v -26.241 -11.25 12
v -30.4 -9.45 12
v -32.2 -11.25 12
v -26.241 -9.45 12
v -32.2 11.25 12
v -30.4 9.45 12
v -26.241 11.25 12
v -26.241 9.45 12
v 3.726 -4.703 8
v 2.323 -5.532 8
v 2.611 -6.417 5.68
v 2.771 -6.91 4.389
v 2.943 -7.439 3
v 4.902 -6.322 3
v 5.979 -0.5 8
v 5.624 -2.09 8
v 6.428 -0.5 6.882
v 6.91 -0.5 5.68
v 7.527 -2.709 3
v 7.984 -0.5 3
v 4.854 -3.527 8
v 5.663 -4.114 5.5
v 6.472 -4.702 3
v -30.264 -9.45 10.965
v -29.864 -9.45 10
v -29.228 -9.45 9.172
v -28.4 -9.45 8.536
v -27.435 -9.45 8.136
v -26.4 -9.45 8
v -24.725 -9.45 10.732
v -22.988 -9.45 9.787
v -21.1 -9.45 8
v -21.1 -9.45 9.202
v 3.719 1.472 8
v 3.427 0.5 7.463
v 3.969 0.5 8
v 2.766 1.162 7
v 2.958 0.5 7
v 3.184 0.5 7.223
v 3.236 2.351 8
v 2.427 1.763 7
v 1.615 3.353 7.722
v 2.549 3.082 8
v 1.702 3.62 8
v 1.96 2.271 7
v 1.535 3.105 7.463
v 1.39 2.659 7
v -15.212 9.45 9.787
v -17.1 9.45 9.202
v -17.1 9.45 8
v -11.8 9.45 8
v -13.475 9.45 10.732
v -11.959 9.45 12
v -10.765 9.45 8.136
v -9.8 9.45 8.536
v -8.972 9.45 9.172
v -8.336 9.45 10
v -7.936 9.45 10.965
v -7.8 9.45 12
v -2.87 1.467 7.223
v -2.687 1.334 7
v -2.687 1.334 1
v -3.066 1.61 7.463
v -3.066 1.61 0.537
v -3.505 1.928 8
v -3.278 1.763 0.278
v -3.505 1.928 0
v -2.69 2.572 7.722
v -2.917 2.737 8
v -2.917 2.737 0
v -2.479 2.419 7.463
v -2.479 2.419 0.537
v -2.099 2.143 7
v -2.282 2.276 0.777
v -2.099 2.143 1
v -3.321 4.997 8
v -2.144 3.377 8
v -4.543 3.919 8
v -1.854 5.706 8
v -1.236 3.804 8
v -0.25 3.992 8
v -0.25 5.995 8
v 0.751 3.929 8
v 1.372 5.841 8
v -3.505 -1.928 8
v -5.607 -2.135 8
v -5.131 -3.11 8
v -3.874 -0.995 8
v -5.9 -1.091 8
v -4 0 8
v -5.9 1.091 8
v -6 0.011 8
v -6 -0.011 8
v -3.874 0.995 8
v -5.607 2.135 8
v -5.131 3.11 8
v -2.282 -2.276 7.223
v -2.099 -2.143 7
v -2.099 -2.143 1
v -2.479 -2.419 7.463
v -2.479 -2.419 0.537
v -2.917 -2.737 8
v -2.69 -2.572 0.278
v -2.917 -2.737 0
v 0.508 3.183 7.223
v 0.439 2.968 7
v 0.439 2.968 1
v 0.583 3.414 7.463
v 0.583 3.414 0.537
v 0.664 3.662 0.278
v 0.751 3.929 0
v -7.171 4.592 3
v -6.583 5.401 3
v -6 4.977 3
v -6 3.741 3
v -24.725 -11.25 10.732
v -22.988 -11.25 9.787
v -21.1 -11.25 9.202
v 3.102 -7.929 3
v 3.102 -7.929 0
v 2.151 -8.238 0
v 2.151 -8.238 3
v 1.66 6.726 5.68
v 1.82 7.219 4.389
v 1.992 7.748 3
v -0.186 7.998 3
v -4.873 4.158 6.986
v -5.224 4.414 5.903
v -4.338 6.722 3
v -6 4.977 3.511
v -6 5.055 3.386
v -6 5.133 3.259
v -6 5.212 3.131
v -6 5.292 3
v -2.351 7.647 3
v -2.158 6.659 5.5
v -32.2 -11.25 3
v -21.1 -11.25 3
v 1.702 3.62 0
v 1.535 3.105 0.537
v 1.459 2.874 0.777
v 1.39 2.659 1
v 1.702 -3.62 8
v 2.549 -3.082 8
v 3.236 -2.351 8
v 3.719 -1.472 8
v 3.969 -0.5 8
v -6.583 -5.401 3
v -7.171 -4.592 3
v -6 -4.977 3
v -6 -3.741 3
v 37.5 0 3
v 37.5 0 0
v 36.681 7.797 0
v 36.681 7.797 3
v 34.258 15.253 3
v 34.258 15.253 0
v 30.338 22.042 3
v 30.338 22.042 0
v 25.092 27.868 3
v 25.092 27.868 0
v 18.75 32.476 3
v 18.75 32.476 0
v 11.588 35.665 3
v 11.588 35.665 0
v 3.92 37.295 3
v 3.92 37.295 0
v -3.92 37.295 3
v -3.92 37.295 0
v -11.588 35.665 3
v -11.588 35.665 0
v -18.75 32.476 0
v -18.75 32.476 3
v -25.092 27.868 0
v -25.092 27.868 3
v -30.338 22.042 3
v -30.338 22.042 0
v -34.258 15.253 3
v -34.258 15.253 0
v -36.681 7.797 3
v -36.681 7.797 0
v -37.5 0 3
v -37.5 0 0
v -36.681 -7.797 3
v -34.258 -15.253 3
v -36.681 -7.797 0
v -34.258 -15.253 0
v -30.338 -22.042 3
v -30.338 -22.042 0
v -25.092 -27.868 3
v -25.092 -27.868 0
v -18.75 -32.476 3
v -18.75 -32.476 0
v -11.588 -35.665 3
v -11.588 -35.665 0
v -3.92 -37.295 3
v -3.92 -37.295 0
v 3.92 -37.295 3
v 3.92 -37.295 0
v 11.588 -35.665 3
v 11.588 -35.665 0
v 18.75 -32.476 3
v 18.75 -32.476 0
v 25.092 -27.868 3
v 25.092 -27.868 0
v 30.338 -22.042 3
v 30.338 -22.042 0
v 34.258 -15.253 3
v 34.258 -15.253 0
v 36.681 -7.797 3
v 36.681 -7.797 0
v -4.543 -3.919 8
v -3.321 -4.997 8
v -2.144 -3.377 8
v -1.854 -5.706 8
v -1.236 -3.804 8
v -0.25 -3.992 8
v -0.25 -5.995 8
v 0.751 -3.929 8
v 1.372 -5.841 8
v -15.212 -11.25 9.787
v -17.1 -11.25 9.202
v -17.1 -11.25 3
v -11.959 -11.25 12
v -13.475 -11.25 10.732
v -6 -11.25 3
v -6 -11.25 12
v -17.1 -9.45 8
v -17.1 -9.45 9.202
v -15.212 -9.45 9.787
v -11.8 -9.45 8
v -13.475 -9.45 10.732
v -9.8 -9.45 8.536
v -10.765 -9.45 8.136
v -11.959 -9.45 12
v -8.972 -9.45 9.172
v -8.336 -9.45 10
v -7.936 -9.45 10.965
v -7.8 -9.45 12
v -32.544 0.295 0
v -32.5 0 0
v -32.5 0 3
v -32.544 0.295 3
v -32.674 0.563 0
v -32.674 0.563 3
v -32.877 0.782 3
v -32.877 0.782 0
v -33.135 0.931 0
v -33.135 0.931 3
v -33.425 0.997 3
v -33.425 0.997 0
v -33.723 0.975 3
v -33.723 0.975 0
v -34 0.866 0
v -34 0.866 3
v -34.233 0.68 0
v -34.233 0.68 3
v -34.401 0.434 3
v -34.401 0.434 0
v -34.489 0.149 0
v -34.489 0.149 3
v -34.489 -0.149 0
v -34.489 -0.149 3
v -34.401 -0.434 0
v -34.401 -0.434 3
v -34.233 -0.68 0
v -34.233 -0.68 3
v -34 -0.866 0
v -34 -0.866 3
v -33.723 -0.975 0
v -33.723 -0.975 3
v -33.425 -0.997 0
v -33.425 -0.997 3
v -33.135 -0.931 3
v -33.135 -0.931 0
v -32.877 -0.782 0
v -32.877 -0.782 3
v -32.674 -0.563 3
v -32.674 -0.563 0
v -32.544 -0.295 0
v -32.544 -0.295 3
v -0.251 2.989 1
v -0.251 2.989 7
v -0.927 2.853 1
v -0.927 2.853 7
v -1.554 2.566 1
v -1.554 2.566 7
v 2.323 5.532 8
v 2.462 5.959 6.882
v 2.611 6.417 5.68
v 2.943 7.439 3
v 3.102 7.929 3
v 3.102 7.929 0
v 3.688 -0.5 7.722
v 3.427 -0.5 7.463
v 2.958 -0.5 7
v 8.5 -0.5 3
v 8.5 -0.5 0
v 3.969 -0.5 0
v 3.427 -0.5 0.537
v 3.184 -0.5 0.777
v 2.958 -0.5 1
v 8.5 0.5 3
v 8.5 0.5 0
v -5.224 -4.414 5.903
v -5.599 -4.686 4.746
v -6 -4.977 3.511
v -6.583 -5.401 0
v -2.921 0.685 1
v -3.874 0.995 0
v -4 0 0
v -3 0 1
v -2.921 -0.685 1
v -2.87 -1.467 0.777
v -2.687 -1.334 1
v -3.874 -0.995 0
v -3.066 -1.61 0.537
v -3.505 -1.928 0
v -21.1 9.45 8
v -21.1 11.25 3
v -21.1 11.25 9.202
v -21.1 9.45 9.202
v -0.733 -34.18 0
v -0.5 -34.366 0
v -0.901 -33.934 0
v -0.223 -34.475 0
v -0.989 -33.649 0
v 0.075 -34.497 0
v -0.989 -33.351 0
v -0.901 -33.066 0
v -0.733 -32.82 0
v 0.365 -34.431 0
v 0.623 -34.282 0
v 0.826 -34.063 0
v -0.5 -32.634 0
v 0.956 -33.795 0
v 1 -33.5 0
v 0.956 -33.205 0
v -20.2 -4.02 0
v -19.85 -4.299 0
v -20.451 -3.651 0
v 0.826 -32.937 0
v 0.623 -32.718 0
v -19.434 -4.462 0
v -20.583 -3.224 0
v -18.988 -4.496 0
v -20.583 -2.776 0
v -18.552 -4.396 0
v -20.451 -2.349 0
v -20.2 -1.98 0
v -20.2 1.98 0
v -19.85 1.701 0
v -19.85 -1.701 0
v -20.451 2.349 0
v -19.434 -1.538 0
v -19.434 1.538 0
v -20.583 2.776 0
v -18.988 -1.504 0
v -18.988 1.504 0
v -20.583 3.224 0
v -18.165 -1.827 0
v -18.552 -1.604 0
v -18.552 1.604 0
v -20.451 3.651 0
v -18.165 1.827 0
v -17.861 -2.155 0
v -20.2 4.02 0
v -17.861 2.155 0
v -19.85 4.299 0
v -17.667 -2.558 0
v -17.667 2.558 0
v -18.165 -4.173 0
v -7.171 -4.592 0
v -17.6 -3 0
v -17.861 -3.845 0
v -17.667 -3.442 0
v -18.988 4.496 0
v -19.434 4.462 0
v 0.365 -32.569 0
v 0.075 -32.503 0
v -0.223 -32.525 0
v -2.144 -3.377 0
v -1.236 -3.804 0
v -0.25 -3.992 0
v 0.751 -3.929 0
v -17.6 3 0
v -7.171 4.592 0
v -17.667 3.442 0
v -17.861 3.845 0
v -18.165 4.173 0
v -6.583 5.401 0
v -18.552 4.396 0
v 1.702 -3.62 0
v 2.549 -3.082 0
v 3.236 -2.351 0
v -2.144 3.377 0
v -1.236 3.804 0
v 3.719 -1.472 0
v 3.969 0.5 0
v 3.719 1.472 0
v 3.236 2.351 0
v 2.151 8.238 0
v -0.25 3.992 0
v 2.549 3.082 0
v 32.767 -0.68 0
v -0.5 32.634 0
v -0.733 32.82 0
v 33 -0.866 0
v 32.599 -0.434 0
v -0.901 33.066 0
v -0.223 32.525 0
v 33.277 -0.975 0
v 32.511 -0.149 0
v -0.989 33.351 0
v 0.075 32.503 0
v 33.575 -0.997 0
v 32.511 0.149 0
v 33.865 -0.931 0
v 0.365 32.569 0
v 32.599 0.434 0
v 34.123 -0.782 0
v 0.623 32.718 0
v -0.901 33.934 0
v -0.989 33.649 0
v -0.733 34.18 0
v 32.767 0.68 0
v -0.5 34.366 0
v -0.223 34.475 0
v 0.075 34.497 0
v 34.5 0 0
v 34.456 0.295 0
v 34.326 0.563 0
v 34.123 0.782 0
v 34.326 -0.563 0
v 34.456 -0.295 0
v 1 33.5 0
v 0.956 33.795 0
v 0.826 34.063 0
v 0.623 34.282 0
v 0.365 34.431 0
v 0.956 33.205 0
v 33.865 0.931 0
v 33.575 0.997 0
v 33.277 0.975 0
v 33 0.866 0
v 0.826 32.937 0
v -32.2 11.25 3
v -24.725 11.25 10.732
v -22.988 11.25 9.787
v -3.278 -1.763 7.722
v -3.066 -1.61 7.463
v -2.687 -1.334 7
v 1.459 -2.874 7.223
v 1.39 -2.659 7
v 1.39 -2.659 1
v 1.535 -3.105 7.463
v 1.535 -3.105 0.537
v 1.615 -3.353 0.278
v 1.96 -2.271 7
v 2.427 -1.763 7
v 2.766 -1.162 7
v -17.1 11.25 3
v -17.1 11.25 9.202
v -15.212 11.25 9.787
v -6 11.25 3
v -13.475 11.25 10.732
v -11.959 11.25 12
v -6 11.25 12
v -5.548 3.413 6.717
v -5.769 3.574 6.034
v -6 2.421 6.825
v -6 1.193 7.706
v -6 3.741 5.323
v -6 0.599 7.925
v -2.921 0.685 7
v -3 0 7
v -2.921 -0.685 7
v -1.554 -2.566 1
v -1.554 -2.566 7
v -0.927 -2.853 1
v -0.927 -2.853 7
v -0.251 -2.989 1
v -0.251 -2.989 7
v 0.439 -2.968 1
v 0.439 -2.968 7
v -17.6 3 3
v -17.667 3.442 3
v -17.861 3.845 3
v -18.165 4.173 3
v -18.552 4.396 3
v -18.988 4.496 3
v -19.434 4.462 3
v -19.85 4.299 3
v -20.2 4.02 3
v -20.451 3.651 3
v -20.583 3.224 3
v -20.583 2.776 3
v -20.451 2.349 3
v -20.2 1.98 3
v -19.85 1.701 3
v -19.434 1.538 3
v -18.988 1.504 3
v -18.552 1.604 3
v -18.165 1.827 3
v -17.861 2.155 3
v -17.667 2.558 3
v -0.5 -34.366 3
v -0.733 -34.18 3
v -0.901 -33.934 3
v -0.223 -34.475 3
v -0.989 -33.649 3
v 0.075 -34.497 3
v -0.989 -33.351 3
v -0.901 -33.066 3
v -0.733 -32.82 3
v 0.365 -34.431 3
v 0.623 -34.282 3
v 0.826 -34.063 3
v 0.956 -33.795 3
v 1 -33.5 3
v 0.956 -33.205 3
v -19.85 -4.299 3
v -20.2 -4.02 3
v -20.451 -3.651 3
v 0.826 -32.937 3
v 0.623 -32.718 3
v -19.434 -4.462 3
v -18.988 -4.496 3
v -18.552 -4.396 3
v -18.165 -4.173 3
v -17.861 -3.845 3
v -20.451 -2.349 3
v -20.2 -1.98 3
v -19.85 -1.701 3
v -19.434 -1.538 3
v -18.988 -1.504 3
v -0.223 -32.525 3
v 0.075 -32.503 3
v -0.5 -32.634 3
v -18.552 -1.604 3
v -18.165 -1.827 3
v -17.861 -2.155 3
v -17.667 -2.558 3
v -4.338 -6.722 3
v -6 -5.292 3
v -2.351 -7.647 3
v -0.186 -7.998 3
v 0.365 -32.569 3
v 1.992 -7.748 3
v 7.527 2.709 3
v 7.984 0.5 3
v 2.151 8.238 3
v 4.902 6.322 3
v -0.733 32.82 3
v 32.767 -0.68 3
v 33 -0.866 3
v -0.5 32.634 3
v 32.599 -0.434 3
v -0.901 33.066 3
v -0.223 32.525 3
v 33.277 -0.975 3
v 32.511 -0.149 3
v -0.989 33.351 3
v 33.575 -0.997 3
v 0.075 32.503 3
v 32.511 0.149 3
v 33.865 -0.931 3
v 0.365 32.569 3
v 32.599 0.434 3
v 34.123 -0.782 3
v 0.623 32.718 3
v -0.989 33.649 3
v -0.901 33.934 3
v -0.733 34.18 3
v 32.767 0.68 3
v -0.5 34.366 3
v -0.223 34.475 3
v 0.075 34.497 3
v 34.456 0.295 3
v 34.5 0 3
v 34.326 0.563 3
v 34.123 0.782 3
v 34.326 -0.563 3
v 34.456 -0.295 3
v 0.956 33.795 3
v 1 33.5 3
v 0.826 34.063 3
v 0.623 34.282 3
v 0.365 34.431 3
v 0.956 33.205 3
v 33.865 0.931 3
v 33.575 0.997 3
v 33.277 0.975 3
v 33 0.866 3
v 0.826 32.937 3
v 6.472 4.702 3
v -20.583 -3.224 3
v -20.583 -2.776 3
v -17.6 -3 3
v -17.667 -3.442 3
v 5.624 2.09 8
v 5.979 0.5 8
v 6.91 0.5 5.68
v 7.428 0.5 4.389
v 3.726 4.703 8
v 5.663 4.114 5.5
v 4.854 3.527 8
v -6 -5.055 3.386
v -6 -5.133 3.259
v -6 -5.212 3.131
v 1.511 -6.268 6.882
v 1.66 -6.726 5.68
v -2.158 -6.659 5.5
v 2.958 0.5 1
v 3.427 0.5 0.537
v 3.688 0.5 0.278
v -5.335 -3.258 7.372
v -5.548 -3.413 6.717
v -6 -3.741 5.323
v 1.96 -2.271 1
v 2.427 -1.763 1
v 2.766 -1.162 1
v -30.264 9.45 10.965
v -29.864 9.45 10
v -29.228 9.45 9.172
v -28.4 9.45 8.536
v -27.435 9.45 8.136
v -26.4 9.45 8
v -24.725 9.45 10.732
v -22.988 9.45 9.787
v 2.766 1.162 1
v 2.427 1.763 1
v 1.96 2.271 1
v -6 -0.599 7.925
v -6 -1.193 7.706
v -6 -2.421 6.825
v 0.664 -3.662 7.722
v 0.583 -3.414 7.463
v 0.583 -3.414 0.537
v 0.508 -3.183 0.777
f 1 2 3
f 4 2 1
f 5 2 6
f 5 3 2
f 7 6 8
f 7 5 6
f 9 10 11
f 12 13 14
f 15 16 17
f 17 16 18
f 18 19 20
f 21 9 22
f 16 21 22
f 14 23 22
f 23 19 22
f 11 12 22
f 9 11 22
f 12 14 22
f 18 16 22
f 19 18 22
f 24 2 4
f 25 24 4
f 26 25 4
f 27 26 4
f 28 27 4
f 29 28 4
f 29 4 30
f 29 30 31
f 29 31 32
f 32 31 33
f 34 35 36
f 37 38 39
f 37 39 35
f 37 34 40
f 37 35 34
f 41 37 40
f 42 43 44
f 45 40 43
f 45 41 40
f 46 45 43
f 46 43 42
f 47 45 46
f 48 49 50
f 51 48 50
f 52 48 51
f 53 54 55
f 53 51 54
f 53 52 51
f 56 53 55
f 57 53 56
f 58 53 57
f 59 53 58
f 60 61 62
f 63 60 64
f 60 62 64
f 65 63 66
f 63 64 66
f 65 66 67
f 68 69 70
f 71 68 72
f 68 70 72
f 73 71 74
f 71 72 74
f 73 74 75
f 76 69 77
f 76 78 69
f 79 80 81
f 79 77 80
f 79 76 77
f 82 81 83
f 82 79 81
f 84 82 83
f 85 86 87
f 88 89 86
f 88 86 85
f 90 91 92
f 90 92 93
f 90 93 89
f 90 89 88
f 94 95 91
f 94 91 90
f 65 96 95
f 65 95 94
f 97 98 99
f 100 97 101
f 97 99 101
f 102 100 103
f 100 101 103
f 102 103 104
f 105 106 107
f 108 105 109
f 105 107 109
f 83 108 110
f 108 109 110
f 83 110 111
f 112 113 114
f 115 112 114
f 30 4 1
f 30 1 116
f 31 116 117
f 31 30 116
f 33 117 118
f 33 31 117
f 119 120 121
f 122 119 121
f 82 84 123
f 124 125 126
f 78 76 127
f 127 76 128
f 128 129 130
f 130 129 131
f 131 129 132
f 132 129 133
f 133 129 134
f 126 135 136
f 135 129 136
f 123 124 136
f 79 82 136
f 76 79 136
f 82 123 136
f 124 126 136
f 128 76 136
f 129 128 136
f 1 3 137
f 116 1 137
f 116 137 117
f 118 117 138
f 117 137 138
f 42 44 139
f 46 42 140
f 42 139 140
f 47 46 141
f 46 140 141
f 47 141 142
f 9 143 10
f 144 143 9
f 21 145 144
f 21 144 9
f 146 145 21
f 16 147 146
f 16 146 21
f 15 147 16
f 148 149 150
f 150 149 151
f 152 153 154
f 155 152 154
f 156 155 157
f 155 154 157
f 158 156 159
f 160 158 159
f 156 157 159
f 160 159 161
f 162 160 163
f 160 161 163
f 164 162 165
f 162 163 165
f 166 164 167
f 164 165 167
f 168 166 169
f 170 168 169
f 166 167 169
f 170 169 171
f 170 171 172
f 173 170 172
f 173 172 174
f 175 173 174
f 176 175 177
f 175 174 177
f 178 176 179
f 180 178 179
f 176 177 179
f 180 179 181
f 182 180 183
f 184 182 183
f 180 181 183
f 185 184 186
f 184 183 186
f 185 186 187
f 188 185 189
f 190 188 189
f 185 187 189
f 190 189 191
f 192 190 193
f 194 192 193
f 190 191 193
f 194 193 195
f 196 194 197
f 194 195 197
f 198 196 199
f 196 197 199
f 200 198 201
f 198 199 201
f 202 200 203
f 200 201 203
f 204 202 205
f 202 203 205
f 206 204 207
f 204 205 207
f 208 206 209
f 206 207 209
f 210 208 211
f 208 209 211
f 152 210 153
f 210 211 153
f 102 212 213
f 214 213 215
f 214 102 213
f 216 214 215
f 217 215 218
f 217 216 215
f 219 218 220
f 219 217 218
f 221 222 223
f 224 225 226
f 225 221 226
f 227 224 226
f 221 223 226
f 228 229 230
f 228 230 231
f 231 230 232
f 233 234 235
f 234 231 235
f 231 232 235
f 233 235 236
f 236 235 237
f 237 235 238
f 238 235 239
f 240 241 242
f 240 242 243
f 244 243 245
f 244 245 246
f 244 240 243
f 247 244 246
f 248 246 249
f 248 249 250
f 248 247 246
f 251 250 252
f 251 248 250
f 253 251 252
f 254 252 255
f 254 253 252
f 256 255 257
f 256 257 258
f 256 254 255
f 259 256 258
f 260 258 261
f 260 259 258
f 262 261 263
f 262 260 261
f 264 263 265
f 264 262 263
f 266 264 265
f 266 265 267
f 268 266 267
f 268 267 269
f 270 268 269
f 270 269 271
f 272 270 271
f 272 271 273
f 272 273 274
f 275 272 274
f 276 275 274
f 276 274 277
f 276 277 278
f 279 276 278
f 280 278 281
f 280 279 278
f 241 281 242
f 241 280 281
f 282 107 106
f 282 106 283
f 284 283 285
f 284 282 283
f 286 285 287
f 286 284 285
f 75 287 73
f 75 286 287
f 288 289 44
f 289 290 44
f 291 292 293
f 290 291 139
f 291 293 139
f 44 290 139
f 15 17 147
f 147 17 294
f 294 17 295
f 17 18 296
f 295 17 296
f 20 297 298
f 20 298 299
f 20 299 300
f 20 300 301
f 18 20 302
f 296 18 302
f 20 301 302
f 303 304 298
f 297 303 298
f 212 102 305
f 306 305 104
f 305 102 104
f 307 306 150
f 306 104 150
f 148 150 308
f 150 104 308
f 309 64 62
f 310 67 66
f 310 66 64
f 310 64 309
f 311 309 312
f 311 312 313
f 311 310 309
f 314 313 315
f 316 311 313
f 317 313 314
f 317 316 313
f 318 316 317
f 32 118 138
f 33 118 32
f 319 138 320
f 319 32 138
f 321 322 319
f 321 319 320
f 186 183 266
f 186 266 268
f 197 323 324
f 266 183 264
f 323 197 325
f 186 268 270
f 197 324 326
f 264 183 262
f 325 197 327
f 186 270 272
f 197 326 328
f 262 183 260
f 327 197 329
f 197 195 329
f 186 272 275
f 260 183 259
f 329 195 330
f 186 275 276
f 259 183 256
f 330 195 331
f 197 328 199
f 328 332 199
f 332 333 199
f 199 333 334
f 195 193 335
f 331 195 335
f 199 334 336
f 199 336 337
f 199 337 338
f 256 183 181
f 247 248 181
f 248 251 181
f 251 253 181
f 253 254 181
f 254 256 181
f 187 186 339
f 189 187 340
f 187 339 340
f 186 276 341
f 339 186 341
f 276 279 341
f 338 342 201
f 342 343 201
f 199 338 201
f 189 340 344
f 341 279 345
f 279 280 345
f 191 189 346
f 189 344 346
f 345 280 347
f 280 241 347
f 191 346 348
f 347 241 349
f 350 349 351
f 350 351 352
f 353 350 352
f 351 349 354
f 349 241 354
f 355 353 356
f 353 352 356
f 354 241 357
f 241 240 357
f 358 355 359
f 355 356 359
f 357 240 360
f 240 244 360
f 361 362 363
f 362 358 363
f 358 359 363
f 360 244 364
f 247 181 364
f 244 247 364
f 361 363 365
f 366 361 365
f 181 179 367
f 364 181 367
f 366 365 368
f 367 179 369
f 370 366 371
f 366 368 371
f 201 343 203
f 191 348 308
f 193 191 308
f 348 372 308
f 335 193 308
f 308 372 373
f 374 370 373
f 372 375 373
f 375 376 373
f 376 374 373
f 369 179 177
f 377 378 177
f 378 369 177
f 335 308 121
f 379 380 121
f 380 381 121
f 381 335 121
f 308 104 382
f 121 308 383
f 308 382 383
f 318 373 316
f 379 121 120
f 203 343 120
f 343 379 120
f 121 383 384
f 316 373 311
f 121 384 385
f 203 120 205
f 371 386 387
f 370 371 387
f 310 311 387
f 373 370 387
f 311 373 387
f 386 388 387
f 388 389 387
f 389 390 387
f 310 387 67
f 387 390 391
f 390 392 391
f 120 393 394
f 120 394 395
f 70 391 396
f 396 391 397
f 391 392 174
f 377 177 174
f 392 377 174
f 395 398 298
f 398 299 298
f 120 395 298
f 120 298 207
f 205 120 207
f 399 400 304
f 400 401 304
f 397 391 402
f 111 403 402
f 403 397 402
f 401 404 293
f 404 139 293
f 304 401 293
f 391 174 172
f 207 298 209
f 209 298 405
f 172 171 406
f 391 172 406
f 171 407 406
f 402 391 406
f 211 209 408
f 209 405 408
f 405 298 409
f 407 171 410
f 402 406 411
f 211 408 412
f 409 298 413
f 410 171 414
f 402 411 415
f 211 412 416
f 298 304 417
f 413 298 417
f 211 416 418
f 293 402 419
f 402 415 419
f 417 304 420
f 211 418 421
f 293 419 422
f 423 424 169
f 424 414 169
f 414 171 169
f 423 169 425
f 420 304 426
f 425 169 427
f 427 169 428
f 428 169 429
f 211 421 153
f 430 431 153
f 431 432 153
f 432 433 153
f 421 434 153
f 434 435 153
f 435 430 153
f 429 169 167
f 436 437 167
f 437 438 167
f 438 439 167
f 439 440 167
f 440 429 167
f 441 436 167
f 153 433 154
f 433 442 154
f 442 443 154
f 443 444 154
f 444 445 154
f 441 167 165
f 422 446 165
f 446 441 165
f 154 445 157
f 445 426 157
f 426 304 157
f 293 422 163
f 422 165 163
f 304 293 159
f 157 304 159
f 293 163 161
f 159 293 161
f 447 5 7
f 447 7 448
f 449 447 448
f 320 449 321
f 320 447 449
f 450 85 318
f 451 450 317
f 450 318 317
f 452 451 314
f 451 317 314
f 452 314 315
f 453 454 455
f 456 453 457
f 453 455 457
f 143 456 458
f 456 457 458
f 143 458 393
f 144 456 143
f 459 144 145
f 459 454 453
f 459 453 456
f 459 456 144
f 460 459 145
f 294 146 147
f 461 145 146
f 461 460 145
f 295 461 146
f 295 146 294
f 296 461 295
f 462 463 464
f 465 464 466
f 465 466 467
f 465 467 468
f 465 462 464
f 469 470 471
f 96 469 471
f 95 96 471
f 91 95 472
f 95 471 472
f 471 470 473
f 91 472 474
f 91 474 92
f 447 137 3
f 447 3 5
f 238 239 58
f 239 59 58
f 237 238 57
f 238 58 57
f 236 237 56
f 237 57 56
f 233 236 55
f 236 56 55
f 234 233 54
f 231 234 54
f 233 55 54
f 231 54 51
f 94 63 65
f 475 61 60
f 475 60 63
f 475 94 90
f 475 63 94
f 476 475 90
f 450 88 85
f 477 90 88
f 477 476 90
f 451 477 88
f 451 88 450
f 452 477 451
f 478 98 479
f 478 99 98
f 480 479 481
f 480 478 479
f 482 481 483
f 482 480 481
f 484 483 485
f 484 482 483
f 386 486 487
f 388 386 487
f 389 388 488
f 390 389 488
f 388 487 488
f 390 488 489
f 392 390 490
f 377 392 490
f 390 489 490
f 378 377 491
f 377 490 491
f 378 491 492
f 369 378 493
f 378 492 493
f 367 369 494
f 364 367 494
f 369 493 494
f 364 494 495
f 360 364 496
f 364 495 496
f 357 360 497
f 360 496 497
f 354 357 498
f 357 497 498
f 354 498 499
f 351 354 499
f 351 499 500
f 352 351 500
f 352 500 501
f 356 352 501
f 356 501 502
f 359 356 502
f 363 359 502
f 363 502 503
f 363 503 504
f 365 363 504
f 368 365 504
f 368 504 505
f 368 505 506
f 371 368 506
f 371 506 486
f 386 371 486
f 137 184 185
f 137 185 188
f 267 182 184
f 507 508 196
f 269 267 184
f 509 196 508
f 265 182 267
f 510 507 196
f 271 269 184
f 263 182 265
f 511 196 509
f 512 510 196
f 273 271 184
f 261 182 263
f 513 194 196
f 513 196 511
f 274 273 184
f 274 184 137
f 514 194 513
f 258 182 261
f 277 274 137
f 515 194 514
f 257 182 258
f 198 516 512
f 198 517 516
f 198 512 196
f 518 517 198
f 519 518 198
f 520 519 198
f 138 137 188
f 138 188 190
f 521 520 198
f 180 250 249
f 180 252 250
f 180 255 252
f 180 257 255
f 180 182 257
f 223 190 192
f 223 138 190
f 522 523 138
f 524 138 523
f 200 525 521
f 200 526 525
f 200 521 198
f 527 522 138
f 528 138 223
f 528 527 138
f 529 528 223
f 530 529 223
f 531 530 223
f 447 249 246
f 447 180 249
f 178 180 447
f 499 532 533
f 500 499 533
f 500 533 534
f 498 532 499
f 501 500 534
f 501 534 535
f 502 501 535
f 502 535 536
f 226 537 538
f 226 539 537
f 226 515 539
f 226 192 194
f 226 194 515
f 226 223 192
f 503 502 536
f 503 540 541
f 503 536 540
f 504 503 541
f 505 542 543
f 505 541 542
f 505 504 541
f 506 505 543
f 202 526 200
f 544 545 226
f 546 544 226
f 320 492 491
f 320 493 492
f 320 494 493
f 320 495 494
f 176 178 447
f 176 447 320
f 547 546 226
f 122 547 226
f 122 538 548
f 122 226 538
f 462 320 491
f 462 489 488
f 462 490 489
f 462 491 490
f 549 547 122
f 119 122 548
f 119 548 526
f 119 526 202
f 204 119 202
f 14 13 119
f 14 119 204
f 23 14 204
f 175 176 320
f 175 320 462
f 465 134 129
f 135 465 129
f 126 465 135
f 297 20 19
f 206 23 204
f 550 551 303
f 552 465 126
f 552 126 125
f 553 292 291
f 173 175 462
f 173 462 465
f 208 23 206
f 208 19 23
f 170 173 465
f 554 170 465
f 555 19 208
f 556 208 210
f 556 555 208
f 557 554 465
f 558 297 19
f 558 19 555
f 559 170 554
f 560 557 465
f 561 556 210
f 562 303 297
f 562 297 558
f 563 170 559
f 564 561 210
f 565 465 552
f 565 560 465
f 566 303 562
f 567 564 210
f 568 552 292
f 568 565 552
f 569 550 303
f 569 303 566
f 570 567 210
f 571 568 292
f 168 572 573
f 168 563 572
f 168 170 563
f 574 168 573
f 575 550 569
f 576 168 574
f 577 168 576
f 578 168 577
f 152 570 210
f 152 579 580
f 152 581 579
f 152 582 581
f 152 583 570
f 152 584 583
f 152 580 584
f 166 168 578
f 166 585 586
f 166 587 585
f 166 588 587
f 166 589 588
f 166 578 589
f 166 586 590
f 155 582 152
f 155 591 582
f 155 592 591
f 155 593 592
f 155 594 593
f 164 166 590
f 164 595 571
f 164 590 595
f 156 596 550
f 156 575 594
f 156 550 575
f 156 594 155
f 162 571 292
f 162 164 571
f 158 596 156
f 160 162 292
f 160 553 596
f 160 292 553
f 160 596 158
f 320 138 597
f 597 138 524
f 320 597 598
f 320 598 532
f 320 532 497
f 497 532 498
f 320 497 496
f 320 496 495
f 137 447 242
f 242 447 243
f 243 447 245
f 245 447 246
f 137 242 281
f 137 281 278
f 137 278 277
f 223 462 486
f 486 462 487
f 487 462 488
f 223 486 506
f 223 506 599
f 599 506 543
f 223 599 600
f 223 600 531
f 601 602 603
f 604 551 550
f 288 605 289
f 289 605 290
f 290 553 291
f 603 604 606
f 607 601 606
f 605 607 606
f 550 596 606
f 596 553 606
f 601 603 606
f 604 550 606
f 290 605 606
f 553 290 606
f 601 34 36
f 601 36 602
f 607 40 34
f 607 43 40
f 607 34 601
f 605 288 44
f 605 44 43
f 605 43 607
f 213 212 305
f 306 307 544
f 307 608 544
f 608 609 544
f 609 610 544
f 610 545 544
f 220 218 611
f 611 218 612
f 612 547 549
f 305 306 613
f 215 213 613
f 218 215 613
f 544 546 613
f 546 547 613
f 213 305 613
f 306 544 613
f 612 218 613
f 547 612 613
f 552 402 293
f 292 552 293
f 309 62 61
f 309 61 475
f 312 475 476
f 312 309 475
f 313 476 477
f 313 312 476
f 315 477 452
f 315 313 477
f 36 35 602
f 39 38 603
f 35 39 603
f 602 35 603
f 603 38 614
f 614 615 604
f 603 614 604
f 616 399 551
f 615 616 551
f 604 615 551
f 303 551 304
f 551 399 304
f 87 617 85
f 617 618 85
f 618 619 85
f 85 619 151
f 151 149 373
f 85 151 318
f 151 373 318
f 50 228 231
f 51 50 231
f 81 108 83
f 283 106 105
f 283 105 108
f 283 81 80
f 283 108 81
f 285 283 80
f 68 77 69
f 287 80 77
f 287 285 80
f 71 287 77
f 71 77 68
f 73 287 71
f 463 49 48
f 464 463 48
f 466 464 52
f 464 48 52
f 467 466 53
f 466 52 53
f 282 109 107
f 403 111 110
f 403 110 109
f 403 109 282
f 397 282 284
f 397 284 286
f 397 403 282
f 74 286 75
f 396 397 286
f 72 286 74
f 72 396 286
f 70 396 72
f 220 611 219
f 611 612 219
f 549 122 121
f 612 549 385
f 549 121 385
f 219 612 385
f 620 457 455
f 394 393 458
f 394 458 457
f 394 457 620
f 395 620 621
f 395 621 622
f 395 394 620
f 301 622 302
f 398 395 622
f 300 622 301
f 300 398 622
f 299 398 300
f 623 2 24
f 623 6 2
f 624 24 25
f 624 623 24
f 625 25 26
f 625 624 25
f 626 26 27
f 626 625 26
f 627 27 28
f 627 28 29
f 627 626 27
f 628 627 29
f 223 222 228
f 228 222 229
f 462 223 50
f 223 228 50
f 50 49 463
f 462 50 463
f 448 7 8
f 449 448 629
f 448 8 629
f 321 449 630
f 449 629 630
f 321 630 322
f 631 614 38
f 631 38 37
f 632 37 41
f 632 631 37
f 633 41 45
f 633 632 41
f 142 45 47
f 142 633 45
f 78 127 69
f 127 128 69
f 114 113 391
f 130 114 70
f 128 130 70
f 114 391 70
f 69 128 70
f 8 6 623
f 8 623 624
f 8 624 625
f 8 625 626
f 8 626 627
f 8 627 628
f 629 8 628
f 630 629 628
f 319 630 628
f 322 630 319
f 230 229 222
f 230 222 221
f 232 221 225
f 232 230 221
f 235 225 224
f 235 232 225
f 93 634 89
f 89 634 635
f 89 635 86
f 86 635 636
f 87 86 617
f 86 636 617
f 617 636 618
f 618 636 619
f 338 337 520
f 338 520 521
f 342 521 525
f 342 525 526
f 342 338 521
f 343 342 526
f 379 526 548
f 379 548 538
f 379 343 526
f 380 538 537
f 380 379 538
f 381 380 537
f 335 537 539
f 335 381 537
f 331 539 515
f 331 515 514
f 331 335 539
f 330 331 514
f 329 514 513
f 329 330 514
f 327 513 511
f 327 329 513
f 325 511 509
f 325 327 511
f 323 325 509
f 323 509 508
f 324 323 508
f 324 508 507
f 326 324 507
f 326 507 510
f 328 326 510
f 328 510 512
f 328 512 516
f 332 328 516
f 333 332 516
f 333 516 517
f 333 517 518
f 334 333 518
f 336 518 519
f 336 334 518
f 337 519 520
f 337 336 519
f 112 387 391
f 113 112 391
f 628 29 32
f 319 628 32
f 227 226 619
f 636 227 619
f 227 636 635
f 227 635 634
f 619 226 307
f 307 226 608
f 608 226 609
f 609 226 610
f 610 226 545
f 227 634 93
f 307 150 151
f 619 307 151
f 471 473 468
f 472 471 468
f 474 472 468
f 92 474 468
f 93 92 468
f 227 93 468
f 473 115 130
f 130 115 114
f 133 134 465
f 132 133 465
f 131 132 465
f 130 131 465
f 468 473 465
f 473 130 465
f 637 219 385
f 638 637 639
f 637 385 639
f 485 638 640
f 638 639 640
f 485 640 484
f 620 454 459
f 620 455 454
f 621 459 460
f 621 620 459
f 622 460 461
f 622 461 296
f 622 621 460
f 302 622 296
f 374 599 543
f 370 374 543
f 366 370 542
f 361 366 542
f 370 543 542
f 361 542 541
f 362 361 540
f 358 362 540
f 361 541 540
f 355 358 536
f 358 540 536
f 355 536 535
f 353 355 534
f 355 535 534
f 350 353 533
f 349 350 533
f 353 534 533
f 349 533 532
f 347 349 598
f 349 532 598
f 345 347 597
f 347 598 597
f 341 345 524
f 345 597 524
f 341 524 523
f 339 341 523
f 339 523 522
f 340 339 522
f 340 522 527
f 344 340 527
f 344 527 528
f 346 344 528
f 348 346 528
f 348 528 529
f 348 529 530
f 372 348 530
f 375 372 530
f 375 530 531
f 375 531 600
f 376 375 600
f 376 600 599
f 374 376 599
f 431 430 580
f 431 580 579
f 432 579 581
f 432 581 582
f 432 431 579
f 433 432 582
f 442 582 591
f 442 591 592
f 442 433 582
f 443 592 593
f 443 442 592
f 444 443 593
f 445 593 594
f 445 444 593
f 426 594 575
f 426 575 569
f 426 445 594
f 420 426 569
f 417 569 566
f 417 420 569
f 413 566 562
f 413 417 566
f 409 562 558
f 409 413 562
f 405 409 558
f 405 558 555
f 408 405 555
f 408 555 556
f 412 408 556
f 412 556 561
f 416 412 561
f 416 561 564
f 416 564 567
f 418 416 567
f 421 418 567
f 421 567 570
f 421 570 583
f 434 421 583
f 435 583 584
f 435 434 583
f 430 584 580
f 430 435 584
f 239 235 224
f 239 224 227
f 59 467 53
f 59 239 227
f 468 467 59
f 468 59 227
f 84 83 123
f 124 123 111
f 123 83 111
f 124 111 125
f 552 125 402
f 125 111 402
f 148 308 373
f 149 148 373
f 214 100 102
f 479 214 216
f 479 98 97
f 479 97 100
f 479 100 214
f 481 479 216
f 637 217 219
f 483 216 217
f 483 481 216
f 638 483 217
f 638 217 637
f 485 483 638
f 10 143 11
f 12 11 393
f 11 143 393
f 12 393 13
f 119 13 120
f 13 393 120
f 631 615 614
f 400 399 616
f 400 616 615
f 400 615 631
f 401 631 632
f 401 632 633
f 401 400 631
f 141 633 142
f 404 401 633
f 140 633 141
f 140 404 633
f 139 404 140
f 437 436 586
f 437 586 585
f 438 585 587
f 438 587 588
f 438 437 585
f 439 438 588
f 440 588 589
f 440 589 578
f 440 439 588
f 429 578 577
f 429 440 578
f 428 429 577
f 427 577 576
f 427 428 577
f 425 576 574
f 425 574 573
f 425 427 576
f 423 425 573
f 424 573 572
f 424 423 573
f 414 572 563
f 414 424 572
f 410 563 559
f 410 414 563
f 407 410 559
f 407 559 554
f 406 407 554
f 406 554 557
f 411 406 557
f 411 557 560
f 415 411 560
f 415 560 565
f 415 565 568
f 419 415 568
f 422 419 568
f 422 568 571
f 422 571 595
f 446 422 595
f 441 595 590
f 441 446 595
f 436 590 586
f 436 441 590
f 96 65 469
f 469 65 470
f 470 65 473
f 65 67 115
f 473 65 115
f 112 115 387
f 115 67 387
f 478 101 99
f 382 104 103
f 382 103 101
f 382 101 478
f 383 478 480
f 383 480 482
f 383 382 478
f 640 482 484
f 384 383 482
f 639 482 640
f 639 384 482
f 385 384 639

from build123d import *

# Parameters (mm, degrees)
F0_R      = 37.5
F0_R_2    = 1
F0_R_3    = 3
F1_DEPTH  = 3
F2_R      = 8
F2_R_2    = 3
F3_DEPTH  = 5
F4_SIZE2  = 4.99999
F4_SIZE   = 1.99999
F5_SIZE   = 1
F7_DEPTH  = 8.001
F8_R      = 1.5
F9_DEPTH  = 3.001
F10_W     = 26.2
F10_H     = 22.5
F11_DEPTH = 9
F12_W     = 22.6
F12_H     = 18.9
F13_DEPTH = 4
F14_R     = 3.99999
F15_W     = 4
F15_H     = 22.5
F16_DEPTH = 9
F18_DEPTH = 25


# Not quite as in the source:
# - a fillet or chamfer is up to 0.001 mm smaller than in the source, because OpenCascade refuses the exact size


with BuildPart() as f1:
    # F0 (on Top) → F1 (new body)
    with BuildSketch(Plane.XY):
        Circle(F0_R)
        with Locations((0, -33.5)):
            Circle(F0_R_2, mode=Mode.SUBTRACT)
        with Locations((-33.5, 0)):
            Circle(F0_R_2, mode=Mode.SUBTRACT)
        Circle(F0_R_3, mode=Mode.SUBTRACT)
        with Locations((33.5, 0)):
            Circle(F0_R_2, mode=Mode.SUBTRACT)
        with Locations((0, 33.5)):
            Circle(F0_R_2, mode=Mode.SUBTRACT)
    extrude(amount=F1_DEPTH)

    # F2 (on face) → F3 (join)
    with BuildSketch(Plane.XY.offset(3)):
        Circle(F2_R)
        Circle(F2_R_2, mode=Mode.SUBTRACT)
    extrude(amount=F3_DEPTH)

    # F4 (size 2 and 5 in the source; OpenCascade refuses exactly that, so slightly less here)
    f4_edges = [f1.edges().sort_by_distance(p)[0] for p in [
        (-8, 0, 8),
    ]]
    f4_side = f1.faces().sort_by_distance((-7.773726, 0, 8))[0]
    chamfer(f4_edges, length=F4_SIZE, length2=F4_SIZE2, reference=f4_side)

    # F5
    f5_edges = [f1.edges().sort_by_distance(p)[0] for p in [
        (-3, 0, 0),
        (3, 0, 4),
        (-3, 0, 8),
    ]]
    chamfer(f5_edges, length=F5_SIZE)

    # F6 (on face) → F7 (cut, through all)
    with BuildSketch(Plane(origin=(0, 0, 0), x_dir=(1, 0, 0), z_dir=(0, 0, -1))):
        with BuildLine():
            Line((-1.7286498598, 1.8739716279), (-2.9167940342, 2.7372089))
            ThreePointArc((-2.9167940342, 2.7372089), (-3.2360679775, 2.3511410092), (-3.5045792865, 1.9281919056))
            Line((-3.5045792865, 1.9281919056), (-2.3164351121, 1.0649546335))
            Line((-2.3164351121, 1.0649546335), (-1.7286498598, 1.8739716279))
        make_face()
        with BuildLine():
            Line((1.2480707441, 2.2231327936), (1.7019014352, 3.6198800401))
            ThreePointArc((1.7019014352, 3.6198800401), (1.2360679775, 3.8042260652), (0.7508449189, 3.9288970345))
            Line((0.7508449189, 3.9288970345), (0.2970142278, 2.5321497879))
            Line((0.2970142278, 2.5321497879), (1.2480707441, 2.2231327936))
        make_face()
        with BuildLine():
            ThreePointArc((0.7508449189, 3.9288970345), (1.2360679775, 3.8042260652), (1.7019014352, 3.6198800401))
            Line((1.7019014352, 3.6198800401), (3.1021727103, 7.9294718913))
            Line((3.1021727103, 7.9294718913), (2.151116194, 8.2384888857))
            Line((2.151116194, 8.2384888857), (0.7508449189, 3.9288970345))
        make_face()
        with BuildLine():
            Line((8.5, -0.5), (8.5, 0.5))
            Line((8.5, 0.5), (3.9686269666, 0.5))
            ThreePointArc((3.9686269666, 0.5), (3.9921490369, 0.2504916502), (4, 0))
            ThreePointArc((4, 0), (3.9921490369, -0.2504916502), (3.9686269666, -0.5))
            Line((3.9686269666, -0.5), (8.5, -0.5))
        make_face()
        with BuildLine():
            Line((3.1021727103, -7.9294718913), (1.7019014352, -3.6198800401))
            ThreePointArc((1.7019014352, -3.6198800401), (1.2360679775, -3.8042260652), (0.7508449189, -3.9288970345))
            Line((0.7508449189, -3.9288970345), (2.151116194, -8.2384888857))
            Line((2.151116194, -8.2384888857), (3.1021727103, -7.9294718913))
        make_face()
        with BuildLine():
            ThreePointArc((4, 0), (3.9921490369, 0.2504916502), (3.9686269666, 0.5))
            Line((3.9686269666, 0.5), (2.5, 0.5))
            Line((2.5, 0.5), (2.5, -0.5))
            Line((2.5, -0.5), (3.9686269666, -0.5))
            ThreePointArc((3.9686269666, -0.5), (3.9921490369, -0.2504916502), (4, 0))
        make_face()
        with BuildLine():
            ThreePointArc((0.7508449189, -3.9288970345), (1.2360679775, -3.8042260652), (1.7019014352, -3.6198800401))
            Line((1.7019014352, -3.6198800401), (1.2480707441, -2.2231327936))
            Line((1.2480707441, -2.2231327936), (0.2970142278, -2.5321497879))
            Line((0.2970142278, -2.5321497879), (0.7508449189, -3.9288970345))
        make_face()
        with BuildLine():
            Line((-6.582751826, -5.4006831417), (-2.9167940342, -2.7372089))
            ThreePointArc((-2.9167940342, -2.7372089), (-3.2360679775, -2.3511410092), (-3.5045792865, -1.9281919056))
            Line((-3.5045792865, -1.9281919056), (-7.1705370783, -4.5916661473))
            Line((-7.1705370783, -4.5916661473), (-6.582751826, -5.4006831417))
        make_face()
        with BuildLine():
            ThreePointArc((-3.5045792865, -1.9281919056), (-3.2360679775, -2.3511410092), (-2.9167940342, -2.7372089))
            Line((-2.9167940342, -2.7372089), (-1.7286498598, -1.8739716279))
            Line((-1.7286498598, -1.8739716279), (-2.3164351121, -1.0649546335))
            Line((-2.3164351121, -1.0649546335), (-3.5045792865, -1.9281919056))
        make_face()
        with BuildLine():
            ThreePointArc((-3.5045792865, 1.9281919056), (-3.2360679775, 2.3511410092), (-2.9167940342, 2.7372089))
            Line((-2.9167940342, 2.7372089), (-6.582751826, 5.4006831417))
            Line((-6.582751826, 5.4006831417), (-7.1705370783, 4.5916661473))
            Line((-7.1705370783, 4.5916661473), (-3.5045792865, 1.9281919056))
        make_face()
    extrude(amount=-F7_DEPTH, mode=Mode.SUBTRACT)

    # F8 (on face) → F9 (cut, through all)
    with BuildSketch(Plane.XY.offset(3)):
        with Locations((-19.1, 3)):
            Circle(F8_R)
        with Locations((-19.1, -3)):
            Circle(F8_R)
    extrude(amount=-F9_DEPTH, mode=Mode.SUBTRACT)

    # F10 (on face) → F11 (join)
    with BuildSketch(Plane.XY.offset(3)):
        with Locations((-19.1, 0)):
            Rectangle(F10_W, F10_H)
    extrude(amount=F11_DEPTH)

    # F12 (on face) → F13 (cut)
    with BuildSketch(Plane.XY.offset(12)):
        with Locations((-19.1, 0)):
            Rectangle(F12_W, F12_H)
    extrude(amount=-F13_DEPTH, mode=Mode.SUBTRACT)

    # F14 (radius 4 in the source; OpenCascade refuses exactly that, so slightly less here)
    f14_edges = [f1.edges().sort_by_distance(p)[0] for p in [
        (-30.4, 0, 8),
        (-7.8, 0, 8),
    ]]
    fillet(f14_edges, radius=F14_R)

    # F15 (on face) → F16 (cut, through all)
    with BuildSketch(Plane.XY.offset(12)):
        with Locations((-19.1, 0)):
            Rectangle(F15_W, F15_H)
    extrude(amount=-F16_DEPTH, mode=Mode.SUBTRACT)

    # F17 (on face) → F18 (cut, symmetric)
    with BuildSketch(Plane.XZ.offset(-9.45)):
        with BuildLine():
            ThreePointArc((-11.9585715715, 12), (-9.8421848073, 15.2194103823), (-9.1, 19))
            ThreePointArc((-9.1, 19), (-26.8459666924, 25.3245553203), (-17.1, 9.2020410289))
            Line((-17.1, 9.2020410289), (-17.1, 12))
            Line((-17.1, 12), (-11.9585715715, 12))
        make_face()
        with BuildLine():
            Line((-17.1, 12), (-17.1, 9.2020410289))
            ThreePointArc((-17.1, 9.2020410289), (-14.3199820053, 10.2164114412), (-11.9585715715, 12))
            Line((-11.9585715715, 12), (-17.1, 12))
        make_face()
    extrude(amount=F18_DEPTH, both=True, mode=Mode.SUBTRACT)


solid = f1.part
